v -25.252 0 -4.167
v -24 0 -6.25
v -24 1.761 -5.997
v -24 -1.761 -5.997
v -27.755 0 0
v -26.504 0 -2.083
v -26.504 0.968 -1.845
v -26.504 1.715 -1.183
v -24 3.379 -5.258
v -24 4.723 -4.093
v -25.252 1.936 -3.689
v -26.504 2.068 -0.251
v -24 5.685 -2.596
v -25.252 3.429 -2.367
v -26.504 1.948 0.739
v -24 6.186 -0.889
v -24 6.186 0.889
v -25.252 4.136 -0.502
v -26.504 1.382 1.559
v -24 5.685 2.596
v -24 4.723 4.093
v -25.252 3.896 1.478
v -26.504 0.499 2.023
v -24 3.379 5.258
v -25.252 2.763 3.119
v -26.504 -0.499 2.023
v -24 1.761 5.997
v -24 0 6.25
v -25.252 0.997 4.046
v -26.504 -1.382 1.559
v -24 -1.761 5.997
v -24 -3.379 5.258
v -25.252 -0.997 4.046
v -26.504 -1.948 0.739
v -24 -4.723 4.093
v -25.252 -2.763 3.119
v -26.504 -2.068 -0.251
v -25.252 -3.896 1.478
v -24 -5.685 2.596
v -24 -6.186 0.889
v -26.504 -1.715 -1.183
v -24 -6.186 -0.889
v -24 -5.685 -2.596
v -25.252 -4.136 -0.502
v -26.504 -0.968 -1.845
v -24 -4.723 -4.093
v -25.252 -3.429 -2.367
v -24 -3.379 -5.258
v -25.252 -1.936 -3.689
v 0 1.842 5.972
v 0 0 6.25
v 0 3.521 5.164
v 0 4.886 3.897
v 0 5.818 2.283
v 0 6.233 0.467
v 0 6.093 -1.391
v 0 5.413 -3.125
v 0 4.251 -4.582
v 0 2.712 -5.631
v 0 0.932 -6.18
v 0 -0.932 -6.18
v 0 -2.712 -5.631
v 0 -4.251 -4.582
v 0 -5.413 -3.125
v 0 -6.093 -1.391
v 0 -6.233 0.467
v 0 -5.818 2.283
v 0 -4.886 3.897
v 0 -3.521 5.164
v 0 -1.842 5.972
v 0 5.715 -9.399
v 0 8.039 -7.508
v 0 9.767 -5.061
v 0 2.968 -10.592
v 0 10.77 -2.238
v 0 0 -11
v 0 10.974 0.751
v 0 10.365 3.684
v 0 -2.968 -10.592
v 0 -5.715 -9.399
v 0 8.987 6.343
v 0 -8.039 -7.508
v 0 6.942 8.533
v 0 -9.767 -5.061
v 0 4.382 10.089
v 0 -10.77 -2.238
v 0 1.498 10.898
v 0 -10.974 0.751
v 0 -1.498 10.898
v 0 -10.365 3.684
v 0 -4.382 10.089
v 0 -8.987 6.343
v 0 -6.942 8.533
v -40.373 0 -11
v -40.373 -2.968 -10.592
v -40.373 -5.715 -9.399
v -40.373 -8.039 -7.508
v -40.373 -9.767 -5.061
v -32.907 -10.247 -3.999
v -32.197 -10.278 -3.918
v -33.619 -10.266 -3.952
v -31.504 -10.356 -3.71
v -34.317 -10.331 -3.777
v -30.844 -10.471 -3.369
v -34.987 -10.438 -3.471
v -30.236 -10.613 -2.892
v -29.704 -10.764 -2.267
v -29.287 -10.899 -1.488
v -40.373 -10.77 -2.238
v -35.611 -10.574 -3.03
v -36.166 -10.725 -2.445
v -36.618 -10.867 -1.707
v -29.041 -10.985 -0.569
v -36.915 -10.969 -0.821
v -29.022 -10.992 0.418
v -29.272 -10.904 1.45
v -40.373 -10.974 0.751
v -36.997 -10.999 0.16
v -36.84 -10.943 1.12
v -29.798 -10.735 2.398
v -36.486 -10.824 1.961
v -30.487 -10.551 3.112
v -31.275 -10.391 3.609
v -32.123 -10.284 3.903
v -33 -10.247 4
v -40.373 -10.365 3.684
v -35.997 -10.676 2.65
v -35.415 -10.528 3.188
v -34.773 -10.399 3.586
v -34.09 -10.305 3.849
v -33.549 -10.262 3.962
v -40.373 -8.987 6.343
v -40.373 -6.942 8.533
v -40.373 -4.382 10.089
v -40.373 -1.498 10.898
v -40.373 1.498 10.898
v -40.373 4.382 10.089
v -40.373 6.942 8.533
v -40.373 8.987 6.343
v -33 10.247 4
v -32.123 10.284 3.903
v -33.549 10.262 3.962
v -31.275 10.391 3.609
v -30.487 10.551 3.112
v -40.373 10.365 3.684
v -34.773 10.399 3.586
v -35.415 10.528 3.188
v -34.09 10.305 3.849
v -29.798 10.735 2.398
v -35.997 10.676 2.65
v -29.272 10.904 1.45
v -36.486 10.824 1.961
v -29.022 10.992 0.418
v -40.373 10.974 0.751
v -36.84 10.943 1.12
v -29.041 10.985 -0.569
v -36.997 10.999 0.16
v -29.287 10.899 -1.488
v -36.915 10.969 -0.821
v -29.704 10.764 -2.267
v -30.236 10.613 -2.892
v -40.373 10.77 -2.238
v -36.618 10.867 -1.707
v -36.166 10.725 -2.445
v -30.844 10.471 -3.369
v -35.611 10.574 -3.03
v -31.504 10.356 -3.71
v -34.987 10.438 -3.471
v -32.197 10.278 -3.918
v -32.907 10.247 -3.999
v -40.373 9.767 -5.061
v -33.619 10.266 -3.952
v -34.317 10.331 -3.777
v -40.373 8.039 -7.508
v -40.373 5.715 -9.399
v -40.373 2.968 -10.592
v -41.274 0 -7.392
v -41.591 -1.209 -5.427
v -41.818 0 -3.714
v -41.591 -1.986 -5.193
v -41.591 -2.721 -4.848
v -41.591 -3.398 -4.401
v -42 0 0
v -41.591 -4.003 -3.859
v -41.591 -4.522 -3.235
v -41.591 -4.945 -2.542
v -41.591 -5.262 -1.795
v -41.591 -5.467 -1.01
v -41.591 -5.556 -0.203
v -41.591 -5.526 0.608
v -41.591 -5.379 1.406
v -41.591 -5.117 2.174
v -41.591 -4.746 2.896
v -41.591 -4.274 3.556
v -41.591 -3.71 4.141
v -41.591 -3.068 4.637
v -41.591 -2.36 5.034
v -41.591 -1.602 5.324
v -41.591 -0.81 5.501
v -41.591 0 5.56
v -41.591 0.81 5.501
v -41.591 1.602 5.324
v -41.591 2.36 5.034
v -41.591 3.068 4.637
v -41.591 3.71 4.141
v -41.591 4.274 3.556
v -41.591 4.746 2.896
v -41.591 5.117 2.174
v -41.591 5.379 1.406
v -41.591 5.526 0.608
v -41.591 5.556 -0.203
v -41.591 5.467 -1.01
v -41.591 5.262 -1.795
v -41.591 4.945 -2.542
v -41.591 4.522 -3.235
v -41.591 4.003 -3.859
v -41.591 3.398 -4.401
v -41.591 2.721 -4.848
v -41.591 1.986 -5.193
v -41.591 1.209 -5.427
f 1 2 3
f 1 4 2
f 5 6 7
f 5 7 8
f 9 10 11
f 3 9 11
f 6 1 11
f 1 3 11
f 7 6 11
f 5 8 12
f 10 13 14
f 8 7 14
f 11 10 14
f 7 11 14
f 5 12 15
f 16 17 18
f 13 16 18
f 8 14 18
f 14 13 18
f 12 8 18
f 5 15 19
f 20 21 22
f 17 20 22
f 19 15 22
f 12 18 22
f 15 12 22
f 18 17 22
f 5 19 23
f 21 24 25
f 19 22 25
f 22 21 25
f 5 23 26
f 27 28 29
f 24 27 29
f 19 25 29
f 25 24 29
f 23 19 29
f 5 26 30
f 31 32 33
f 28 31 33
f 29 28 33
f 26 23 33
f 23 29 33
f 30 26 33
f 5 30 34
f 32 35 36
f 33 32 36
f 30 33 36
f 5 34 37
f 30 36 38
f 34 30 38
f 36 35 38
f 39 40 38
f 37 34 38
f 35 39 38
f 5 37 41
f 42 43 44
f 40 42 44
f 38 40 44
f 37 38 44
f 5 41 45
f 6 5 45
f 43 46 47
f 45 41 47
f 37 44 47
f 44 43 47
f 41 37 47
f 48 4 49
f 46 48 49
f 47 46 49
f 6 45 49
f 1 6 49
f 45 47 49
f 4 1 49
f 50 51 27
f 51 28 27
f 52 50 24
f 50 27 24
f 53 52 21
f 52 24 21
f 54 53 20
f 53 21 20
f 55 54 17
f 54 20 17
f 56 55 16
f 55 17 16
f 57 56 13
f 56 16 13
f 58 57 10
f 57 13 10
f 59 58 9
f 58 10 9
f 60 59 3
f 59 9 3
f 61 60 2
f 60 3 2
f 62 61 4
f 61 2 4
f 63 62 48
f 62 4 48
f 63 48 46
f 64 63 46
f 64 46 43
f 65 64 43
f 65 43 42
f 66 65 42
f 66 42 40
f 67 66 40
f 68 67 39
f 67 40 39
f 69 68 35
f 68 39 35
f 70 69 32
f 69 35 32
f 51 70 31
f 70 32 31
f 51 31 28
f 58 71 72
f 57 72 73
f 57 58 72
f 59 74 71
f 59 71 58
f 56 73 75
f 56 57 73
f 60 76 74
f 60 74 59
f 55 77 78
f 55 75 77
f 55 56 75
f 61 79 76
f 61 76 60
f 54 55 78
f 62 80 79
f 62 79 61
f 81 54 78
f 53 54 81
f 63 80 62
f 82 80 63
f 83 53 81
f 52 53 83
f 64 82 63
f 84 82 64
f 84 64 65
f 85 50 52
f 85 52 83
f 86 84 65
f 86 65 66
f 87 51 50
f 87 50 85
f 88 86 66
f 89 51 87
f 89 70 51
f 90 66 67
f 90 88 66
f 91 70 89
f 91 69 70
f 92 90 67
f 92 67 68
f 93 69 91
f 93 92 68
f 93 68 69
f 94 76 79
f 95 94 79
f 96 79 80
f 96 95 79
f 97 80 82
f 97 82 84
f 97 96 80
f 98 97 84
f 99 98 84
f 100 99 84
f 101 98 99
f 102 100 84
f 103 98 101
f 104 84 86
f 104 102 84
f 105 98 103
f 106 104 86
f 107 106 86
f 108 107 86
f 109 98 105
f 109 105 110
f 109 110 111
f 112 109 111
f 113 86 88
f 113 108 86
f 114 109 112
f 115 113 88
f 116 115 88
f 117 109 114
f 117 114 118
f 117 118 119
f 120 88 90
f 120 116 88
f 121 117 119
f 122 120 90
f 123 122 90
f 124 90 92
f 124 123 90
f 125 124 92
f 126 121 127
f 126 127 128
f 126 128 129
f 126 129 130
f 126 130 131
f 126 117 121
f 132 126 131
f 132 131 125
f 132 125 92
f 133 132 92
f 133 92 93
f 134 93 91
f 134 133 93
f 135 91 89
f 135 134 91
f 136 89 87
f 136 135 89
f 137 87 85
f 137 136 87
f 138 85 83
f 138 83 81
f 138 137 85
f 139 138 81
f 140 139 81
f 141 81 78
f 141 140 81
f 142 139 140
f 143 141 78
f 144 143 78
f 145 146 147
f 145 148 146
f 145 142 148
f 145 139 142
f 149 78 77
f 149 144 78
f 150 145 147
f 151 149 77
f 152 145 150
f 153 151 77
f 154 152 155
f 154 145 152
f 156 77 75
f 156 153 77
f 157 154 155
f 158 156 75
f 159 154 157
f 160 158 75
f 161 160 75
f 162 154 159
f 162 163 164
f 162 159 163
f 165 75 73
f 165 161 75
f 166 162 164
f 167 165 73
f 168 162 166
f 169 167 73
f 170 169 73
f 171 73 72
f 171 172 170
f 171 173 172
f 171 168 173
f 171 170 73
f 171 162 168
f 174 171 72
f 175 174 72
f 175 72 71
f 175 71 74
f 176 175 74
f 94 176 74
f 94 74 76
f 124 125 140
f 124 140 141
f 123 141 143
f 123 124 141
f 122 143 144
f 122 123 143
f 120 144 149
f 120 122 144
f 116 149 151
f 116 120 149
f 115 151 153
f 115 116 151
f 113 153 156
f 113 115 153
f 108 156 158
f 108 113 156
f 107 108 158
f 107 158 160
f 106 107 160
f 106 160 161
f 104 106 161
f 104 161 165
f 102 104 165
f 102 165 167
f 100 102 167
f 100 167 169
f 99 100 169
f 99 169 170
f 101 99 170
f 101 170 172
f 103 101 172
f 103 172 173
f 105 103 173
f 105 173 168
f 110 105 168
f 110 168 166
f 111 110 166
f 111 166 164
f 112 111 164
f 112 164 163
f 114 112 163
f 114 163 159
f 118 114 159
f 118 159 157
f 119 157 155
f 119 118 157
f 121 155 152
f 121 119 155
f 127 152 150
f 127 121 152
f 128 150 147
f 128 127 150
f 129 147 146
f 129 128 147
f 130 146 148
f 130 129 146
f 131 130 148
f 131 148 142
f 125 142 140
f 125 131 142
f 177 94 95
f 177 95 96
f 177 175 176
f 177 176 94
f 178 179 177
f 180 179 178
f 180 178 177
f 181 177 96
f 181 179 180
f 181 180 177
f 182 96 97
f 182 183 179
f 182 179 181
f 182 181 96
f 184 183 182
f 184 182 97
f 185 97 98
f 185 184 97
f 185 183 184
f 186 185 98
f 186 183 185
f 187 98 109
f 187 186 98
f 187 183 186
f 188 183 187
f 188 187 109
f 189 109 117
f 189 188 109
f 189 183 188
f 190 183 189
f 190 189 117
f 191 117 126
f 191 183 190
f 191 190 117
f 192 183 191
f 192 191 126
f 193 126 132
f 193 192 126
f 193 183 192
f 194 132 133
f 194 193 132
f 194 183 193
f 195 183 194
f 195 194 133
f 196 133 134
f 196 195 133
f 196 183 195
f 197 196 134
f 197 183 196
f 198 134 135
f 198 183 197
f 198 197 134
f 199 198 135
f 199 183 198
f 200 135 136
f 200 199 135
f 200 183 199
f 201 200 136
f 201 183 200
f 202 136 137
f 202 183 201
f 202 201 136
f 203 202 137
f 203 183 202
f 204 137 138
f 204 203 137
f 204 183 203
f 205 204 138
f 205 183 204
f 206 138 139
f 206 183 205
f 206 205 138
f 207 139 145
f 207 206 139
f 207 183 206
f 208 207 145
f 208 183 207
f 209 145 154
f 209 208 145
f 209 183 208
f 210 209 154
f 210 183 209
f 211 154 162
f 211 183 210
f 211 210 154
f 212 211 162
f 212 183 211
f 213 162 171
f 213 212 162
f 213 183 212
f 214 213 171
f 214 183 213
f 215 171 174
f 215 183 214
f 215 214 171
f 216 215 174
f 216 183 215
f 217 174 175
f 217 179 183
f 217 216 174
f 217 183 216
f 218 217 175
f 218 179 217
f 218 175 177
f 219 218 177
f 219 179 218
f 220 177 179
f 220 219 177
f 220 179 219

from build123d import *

# Parameters (mm, degrees)
M14X1_5_1_D              = 12.5
M14X1_5_1_DEPTH          = 24
M14X1_5_1_TIP            = 3.755378869
CUT_EXTRUDE_1_DEPTH      = 45.788391353
CUT_EXTRUDE_1_DEPTH_BACK = 45.788391353
SKETCH_4_R               = 4


with BuildPart() as part:
    # 草图1 → 旋转1 (revolve)
    with BuildSketch(Plane.XY, mode=Mode.PRIVATE) as revolve_1_sk:
        with BuildLine():
            Line((0, 0), (0, 11))
            Line((0, 11), (-40.373066959, 11))
            ThreePointArc((-40.373066959, 11), (-41.591066388, 5.559831632), (-42, 0))
            Line((-42, 0), (0, 0))
        make_face()
    revolve(revolve_1_sk.sketch.rotate(Axis((0, 0, 0), (-1, 0, 0)), 90), axis=Axis((0, 0, 0), (-1, 0, 0)))

    # M14X1.5 螺纹孔的螺纹孔钻头1
    with Locations(Plane(origin=(0, 0, 0), x_dir=(0, 0, -1), z_dir=(1, 0, 0))):
        with Locations((0, 0)):
            Hole(M14X1_5_1_D / 2, depth=M14X1_5_1_DEPTH)
            with Locations((0, 0, -(M14X1_5_1_DEPTH + M14X1_5_1_TIP / 2))):  # 118° drill point
                Cone(0, M14X1_5_1_D / 2, M14X1_5_1_TIP, mode=Mode.SUBTRACT)

    # 草图4 → 切除-拉伸1 (cut, two sides: drawn at the far end of the back side and taken through both)
    with BuildSketch(Plane(origin=(0, 0, 0), x_dir=(1, 0, 0), z_dir=(0, 1, 0)).offset(-CUT_EXTRUDE_1_DEPTH_BACK)):
        with Locations(Location((-33, 0, 0), (0, 0, 270))):
            Circle(SKETCH_4_R)
    extrude(amount=CUT_EXTRUDE_1_DEPTH + CUT_EXTRUDE_1_DEPTH_BACK, mode=Mode.SUBTRACT)


solid = part.part
